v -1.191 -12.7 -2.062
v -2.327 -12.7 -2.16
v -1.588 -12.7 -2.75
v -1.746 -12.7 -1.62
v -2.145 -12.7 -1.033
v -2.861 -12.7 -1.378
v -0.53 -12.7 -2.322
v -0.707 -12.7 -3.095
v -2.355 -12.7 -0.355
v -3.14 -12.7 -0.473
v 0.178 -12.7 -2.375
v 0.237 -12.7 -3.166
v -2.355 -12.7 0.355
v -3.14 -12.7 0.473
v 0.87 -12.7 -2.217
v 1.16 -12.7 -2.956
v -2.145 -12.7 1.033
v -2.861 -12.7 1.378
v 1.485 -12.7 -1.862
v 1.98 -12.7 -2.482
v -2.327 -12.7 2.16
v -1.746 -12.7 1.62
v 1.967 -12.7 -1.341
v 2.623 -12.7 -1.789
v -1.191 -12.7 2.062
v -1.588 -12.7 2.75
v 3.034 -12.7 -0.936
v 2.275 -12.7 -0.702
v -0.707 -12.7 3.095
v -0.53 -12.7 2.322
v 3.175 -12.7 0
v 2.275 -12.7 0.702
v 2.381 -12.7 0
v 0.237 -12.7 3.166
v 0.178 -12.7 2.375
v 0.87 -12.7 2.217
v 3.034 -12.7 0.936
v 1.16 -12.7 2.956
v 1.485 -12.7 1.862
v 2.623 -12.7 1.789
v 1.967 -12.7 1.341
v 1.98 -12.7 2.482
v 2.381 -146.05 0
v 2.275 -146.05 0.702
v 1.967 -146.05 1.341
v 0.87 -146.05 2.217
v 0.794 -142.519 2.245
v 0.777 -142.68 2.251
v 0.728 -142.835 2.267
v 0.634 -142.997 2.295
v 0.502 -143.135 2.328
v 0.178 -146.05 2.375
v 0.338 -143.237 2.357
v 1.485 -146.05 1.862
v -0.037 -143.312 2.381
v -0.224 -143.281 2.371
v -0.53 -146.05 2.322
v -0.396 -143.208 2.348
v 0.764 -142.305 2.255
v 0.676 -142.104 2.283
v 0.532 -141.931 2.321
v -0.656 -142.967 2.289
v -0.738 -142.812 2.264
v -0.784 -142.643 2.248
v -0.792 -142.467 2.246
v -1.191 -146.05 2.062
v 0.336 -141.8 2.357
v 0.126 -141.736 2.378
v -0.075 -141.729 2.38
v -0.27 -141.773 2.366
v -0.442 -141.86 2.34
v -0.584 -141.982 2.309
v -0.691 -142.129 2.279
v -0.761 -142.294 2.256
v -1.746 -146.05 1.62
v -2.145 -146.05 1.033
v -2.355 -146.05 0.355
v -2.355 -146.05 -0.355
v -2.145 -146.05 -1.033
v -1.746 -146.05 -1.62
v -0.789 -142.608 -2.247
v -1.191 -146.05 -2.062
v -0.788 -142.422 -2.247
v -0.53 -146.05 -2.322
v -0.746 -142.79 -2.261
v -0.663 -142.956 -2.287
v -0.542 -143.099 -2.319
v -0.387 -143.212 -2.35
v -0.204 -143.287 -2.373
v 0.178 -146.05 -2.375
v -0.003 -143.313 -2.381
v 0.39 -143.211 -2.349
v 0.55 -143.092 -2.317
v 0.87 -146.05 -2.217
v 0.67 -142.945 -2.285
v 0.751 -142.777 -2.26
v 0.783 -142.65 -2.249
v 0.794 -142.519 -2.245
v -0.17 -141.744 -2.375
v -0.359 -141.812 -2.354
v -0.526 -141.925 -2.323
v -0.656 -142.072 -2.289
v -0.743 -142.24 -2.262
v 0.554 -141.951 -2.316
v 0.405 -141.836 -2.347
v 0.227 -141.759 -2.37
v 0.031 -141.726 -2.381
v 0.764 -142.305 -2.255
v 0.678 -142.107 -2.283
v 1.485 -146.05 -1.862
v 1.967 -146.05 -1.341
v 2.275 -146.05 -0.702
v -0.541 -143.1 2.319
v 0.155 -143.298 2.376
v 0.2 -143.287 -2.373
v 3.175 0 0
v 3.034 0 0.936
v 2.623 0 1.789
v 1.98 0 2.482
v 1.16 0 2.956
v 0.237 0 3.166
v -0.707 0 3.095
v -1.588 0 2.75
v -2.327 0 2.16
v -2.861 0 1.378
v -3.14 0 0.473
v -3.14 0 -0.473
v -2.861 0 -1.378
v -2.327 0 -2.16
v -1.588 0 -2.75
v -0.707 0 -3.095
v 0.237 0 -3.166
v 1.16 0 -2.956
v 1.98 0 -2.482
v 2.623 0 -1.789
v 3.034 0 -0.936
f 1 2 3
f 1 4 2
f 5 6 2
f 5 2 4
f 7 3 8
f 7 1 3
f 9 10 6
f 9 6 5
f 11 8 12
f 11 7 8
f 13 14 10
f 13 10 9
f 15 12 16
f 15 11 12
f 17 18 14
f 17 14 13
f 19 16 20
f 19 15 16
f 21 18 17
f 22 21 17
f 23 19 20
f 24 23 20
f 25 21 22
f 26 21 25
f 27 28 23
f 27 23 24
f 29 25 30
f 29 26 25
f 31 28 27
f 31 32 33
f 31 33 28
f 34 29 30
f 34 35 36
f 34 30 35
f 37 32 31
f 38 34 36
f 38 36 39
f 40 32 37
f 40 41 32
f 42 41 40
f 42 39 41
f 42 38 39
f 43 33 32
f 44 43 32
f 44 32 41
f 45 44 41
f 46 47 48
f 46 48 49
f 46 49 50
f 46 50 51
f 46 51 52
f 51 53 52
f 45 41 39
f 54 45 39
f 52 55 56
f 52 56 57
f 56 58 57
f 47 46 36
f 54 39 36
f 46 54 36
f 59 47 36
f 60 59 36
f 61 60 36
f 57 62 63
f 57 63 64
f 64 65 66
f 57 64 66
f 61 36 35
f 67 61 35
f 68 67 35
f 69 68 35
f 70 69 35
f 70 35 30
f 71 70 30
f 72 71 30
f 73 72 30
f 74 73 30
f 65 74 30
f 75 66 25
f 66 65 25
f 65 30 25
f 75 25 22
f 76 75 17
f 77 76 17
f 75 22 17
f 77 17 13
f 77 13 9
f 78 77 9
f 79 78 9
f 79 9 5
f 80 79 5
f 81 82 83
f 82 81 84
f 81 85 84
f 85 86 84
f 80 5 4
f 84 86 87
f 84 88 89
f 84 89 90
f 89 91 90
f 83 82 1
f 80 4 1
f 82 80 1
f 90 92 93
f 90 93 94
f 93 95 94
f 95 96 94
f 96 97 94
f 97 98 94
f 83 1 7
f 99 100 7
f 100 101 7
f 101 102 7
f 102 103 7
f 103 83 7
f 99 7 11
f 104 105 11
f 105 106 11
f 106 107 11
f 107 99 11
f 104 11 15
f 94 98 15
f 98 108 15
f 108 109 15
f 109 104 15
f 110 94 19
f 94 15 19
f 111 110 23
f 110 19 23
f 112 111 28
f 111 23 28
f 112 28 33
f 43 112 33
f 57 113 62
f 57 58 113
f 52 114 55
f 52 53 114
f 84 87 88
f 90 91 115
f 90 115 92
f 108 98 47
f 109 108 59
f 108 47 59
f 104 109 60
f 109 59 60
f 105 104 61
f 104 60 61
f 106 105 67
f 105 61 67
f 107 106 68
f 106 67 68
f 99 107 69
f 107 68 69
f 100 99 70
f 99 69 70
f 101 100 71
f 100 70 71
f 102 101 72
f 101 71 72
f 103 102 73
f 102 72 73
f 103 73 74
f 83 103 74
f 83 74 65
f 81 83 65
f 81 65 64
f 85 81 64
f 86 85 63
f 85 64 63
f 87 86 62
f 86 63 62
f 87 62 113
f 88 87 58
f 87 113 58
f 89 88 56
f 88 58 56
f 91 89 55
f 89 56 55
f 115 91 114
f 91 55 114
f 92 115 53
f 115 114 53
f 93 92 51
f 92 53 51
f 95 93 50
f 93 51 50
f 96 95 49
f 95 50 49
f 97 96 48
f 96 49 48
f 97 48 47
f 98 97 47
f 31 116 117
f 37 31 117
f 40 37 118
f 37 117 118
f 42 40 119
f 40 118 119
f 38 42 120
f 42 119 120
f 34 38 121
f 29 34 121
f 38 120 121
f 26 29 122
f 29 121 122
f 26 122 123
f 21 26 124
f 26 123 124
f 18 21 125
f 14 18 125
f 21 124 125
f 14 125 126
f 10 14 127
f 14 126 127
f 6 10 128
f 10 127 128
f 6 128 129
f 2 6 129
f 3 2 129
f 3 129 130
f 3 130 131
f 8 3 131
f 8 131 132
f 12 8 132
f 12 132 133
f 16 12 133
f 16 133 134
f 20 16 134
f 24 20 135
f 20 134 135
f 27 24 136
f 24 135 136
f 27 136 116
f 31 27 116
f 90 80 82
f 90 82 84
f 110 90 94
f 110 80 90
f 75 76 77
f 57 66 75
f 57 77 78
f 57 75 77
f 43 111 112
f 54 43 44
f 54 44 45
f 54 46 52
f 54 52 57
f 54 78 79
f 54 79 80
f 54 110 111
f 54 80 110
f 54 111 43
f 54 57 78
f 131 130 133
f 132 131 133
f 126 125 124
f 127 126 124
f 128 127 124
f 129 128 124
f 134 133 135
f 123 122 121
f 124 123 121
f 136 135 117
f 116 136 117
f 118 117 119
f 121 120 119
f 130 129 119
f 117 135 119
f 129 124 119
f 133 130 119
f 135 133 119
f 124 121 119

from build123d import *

# Parameters (mm, degrees)
F0_R     = 3.175
F0_R_2   = 2.38125
F1_DEPTH = 12.7
F2_DEPTH = 146.05
F3_R     = 0.79375
F4_DEPTH = 3.175


with BuildPart() as f1:
    # F0 (on Front) → F1 (new body)
    with BuildSketch(Plane.XZ):
        Circle(F0_R)
        Circle(F0_R_2, mode=Mode.SUBTRACT)
    extrude(amount=F1_DEPTH)

    # F0 (on Front) → F2 (join)
    with BuildSketch(Plane.XZ):
        Circle(F0_R_2)
    extrude(amount=F2_DEPTH)

    # F3 (on Top) → F4 (cut, symmetric)
    with BuildSketch(Plane.XY):
        with Locations((0, -142.5194)):
            Circle(F3_R)
    extrude(amount=F4_DEPTH, both=True, mode=Mode.SUBTRACT)


solid = f1.part
